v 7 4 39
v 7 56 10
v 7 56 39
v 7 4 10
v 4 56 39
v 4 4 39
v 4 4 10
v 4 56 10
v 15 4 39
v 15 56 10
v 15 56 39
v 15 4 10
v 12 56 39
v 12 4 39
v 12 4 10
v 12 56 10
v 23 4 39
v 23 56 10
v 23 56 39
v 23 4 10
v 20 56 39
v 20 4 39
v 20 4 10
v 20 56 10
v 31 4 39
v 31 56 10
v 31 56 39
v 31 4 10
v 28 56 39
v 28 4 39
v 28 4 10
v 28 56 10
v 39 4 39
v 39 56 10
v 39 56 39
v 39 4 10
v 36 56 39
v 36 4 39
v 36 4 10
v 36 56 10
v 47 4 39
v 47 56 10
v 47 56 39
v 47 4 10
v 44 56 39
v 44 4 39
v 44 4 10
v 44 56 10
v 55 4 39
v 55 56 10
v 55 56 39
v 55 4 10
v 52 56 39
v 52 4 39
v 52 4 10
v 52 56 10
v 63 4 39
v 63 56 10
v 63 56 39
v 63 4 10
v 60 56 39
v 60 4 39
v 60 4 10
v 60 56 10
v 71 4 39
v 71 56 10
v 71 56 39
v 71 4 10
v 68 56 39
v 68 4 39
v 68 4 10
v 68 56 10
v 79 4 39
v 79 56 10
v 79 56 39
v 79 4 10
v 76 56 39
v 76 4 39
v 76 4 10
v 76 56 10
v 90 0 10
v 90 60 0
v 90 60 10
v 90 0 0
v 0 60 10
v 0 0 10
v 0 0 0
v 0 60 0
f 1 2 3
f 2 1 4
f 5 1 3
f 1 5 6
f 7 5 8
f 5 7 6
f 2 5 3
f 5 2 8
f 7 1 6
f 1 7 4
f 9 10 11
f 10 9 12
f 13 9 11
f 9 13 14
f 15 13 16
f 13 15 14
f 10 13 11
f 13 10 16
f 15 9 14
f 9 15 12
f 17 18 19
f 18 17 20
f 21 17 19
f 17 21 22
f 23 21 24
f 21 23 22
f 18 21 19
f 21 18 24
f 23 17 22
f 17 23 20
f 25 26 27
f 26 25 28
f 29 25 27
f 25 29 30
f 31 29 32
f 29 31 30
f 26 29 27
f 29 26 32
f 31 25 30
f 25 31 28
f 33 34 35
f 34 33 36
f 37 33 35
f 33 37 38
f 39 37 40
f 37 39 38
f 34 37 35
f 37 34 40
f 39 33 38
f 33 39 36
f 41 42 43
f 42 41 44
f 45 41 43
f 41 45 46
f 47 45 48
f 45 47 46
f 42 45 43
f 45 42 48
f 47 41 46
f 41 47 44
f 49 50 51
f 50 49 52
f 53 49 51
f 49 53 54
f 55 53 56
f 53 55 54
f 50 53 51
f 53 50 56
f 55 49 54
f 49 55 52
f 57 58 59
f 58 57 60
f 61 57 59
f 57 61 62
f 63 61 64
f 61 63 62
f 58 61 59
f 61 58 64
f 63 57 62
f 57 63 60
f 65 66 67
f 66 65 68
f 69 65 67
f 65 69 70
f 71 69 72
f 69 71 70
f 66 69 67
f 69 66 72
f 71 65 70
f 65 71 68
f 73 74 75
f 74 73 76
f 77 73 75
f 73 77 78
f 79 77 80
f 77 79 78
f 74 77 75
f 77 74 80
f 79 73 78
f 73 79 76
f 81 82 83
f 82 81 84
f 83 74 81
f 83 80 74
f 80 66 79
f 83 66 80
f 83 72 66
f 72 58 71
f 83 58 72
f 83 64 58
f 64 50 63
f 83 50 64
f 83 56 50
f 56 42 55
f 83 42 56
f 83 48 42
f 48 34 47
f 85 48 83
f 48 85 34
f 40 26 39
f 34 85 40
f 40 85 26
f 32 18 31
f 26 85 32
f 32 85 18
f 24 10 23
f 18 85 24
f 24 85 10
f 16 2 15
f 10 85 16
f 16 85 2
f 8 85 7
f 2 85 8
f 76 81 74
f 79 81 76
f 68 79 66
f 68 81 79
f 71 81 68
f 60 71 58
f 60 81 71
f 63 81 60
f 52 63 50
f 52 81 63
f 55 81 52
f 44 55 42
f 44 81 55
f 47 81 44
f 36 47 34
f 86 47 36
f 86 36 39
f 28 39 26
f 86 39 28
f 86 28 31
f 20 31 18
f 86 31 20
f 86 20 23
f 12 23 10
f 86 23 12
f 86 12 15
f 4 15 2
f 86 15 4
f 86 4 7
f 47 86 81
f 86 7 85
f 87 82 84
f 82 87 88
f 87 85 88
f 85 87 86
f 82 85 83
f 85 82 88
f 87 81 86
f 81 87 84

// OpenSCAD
$fn = 32;

// ----------------------------------------------------------------------
// Heatsink: uniform fin block
// ----------------------------------------------------------------------

// --- parameters (mm) ---
base_l = 90;              // base length, X
base_w = 60;              // base width, Y
base_t = 10;              // base plate thickness
fin_h = 30;               // fin height above the base
fin_t = 3;                // fin thickness
edge = 4;                 // margin from the base ends
pitch = 8;                // fin pitch

n_fins = floor((base_l - 2 * edge - fin_t) / pitch) + 1;  // fin count
total_h = base_t + fin_h - 1;  // overall height

union() {
  cube([base_l, base_w, base_t]);
  for (i = [0 : n_fins - 1])
    translate([edge + i * pitch, edge, base_t - 1])
      cube([fin_t, base_w - 2 * edge, fin_h]);
}
